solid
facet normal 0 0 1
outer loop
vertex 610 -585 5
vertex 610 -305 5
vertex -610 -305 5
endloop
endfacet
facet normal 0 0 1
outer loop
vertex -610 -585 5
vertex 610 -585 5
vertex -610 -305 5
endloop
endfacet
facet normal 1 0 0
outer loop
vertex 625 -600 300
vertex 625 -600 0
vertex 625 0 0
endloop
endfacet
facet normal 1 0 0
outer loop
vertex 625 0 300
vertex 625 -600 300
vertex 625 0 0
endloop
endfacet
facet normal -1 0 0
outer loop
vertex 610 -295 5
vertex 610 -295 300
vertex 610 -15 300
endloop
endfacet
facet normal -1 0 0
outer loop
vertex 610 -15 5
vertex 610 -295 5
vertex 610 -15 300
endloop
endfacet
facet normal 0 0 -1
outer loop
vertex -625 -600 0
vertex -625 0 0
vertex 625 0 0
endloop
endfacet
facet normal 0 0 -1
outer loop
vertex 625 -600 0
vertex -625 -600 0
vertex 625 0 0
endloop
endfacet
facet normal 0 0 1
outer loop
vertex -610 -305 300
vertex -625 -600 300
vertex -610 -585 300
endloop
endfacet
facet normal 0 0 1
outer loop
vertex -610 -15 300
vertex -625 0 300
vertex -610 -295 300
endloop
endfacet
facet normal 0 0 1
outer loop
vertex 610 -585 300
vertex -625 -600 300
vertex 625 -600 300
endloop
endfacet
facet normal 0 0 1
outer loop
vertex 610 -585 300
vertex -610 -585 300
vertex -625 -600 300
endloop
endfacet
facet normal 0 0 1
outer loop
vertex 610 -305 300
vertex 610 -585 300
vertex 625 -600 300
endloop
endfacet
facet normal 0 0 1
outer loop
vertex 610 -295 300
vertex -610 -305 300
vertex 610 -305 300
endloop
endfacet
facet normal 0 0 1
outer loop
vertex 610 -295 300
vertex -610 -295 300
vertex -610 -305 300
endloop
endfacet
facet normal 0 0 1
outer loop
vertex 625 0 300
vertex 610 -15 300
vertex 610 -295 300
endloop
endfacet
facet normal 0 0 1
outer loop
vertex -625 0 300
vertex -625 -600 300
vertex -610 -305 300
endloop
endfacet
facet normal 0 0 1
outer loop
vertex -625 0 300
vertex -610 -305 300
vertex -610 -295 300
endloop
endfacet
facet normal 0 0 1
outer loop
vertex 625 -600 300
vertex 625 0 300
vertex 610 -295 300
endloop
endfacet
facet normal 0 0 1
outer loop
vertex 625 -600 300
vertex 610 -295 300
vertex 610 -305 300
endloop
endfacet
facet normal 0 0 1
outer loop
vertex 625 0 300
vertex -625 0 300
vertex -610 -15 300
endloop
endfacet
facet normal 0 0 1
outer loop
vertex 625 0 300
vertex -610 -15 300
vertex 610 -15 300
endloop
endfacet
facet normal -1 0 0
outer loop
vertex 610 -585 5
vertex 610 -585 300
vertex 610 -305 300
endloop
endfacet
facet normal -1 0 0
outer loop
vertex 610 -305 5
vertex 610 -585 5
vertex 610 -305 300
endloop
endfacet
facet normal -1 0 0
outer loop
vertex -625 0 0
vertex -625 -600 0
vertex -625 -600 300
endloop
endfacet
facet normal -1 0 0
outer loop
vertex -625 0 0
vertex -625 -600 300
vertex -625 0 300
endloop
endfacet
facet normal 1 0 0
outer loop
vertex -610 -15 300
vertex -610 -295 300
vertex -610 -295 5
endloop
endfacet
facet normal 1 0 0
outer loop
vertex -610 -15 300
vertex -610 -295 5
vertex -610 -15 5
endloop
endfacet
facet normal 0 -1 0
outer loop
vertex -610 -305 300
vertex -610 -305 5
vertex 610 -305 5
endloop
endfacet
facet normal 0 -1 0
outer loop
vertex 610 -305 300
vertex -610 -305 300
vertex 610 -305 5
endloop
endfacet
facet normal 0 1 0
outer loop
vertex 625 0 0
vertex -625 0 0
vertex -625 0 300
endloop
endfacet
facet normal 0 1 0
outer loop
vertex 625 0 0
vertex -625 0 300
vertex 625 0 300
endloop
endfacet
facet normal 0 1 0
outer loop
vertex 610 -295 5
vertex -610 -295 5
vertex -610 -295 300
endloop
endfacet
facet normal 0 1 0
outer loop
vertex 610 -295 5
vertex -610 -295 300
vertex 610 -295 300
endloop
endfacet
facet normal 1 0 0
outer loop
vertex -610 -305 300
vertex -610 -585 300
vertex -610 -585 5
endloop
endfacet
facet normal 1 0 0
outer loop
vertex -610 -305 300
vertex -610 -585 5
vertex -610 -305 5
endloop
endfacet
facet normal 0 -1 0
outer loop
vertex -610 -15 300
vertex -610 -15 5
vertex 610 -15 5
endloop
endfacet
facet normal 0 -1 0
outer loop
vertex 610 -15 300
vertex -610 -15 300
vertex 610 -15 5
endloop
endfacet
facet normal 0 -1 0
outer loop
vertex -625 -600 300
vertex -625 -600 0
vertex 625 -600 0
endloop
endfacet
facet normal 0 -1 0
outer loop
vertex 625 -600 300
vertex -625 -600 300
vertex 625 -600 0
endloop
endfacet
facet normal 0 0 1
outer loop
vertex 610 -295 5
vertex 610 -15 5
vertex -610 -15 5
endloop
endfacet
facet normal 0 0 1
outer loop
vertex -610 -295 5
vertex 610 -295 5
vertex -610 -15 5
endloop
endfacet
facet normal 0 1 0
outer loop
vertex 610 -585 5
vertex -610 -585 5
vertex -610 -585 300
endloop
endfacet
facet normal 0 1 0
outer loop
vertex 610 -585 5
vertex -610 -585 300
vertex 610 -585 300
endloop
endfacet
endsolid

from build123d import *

# Parameters (mm, degrees)
SKETCH1_W           = 1250
SKETCH1_H           = 600
SKETCH1_W_2         = 1220
SKETCH1_H_2         = 570
SKETCH1_H_3         = 5
BOSS_EXTRUDE1_DEPTH = 300
SKETCH2_W           = 1250
SKETCH2_H           = 600
BOSS_EXTRUDE2_DEPTH = 5


with BuildPart() as part:
    # Sketch1 → Boss-Extrude1 (new body)
    # profile 1 of 3: a face of its own
    with BuildSketch(Plane.XY):
        with Locations((0, -300)):
            Rectangle(SKETCH1_W, SKETCH1_H)
        with Locations((0, -300)):
            Rectangle(SKETCH1_W_2, SKETCH1_H_2, mode=Mode.SUBTRACT)
    # profile 2 of 3: a face of its own
    with BuildSketch(Plane.XY):
        with Locations((0, -302.5)):
            Rectangle(SKETCH1_W_2, SKETCH1_H_3)
    # profile 3 of 3: a face of its own
    with BuildSketch(Plane.XY):
        with Locations((0, -297.5)):
            Rectangle(SKETCH1_W_2, SKETCH1_H_3)
    extrude(amount=BOSS_EXTRUDE1_DEPTH)

    # Sketch2 → Boss-Extrude2 (add)
    with BuildSketch(Plane(origin=(0, 0, 0), x_dir=(-1, 0, 0), z_dir=(0, 0, -1))):
        with Locations((0, -300)):
            Rectangle(SKETCH2_W, SKETCH2_H)
    extrude(amount=-BOSS_EXTRUDE2_DEPTH)


solid = part.part
